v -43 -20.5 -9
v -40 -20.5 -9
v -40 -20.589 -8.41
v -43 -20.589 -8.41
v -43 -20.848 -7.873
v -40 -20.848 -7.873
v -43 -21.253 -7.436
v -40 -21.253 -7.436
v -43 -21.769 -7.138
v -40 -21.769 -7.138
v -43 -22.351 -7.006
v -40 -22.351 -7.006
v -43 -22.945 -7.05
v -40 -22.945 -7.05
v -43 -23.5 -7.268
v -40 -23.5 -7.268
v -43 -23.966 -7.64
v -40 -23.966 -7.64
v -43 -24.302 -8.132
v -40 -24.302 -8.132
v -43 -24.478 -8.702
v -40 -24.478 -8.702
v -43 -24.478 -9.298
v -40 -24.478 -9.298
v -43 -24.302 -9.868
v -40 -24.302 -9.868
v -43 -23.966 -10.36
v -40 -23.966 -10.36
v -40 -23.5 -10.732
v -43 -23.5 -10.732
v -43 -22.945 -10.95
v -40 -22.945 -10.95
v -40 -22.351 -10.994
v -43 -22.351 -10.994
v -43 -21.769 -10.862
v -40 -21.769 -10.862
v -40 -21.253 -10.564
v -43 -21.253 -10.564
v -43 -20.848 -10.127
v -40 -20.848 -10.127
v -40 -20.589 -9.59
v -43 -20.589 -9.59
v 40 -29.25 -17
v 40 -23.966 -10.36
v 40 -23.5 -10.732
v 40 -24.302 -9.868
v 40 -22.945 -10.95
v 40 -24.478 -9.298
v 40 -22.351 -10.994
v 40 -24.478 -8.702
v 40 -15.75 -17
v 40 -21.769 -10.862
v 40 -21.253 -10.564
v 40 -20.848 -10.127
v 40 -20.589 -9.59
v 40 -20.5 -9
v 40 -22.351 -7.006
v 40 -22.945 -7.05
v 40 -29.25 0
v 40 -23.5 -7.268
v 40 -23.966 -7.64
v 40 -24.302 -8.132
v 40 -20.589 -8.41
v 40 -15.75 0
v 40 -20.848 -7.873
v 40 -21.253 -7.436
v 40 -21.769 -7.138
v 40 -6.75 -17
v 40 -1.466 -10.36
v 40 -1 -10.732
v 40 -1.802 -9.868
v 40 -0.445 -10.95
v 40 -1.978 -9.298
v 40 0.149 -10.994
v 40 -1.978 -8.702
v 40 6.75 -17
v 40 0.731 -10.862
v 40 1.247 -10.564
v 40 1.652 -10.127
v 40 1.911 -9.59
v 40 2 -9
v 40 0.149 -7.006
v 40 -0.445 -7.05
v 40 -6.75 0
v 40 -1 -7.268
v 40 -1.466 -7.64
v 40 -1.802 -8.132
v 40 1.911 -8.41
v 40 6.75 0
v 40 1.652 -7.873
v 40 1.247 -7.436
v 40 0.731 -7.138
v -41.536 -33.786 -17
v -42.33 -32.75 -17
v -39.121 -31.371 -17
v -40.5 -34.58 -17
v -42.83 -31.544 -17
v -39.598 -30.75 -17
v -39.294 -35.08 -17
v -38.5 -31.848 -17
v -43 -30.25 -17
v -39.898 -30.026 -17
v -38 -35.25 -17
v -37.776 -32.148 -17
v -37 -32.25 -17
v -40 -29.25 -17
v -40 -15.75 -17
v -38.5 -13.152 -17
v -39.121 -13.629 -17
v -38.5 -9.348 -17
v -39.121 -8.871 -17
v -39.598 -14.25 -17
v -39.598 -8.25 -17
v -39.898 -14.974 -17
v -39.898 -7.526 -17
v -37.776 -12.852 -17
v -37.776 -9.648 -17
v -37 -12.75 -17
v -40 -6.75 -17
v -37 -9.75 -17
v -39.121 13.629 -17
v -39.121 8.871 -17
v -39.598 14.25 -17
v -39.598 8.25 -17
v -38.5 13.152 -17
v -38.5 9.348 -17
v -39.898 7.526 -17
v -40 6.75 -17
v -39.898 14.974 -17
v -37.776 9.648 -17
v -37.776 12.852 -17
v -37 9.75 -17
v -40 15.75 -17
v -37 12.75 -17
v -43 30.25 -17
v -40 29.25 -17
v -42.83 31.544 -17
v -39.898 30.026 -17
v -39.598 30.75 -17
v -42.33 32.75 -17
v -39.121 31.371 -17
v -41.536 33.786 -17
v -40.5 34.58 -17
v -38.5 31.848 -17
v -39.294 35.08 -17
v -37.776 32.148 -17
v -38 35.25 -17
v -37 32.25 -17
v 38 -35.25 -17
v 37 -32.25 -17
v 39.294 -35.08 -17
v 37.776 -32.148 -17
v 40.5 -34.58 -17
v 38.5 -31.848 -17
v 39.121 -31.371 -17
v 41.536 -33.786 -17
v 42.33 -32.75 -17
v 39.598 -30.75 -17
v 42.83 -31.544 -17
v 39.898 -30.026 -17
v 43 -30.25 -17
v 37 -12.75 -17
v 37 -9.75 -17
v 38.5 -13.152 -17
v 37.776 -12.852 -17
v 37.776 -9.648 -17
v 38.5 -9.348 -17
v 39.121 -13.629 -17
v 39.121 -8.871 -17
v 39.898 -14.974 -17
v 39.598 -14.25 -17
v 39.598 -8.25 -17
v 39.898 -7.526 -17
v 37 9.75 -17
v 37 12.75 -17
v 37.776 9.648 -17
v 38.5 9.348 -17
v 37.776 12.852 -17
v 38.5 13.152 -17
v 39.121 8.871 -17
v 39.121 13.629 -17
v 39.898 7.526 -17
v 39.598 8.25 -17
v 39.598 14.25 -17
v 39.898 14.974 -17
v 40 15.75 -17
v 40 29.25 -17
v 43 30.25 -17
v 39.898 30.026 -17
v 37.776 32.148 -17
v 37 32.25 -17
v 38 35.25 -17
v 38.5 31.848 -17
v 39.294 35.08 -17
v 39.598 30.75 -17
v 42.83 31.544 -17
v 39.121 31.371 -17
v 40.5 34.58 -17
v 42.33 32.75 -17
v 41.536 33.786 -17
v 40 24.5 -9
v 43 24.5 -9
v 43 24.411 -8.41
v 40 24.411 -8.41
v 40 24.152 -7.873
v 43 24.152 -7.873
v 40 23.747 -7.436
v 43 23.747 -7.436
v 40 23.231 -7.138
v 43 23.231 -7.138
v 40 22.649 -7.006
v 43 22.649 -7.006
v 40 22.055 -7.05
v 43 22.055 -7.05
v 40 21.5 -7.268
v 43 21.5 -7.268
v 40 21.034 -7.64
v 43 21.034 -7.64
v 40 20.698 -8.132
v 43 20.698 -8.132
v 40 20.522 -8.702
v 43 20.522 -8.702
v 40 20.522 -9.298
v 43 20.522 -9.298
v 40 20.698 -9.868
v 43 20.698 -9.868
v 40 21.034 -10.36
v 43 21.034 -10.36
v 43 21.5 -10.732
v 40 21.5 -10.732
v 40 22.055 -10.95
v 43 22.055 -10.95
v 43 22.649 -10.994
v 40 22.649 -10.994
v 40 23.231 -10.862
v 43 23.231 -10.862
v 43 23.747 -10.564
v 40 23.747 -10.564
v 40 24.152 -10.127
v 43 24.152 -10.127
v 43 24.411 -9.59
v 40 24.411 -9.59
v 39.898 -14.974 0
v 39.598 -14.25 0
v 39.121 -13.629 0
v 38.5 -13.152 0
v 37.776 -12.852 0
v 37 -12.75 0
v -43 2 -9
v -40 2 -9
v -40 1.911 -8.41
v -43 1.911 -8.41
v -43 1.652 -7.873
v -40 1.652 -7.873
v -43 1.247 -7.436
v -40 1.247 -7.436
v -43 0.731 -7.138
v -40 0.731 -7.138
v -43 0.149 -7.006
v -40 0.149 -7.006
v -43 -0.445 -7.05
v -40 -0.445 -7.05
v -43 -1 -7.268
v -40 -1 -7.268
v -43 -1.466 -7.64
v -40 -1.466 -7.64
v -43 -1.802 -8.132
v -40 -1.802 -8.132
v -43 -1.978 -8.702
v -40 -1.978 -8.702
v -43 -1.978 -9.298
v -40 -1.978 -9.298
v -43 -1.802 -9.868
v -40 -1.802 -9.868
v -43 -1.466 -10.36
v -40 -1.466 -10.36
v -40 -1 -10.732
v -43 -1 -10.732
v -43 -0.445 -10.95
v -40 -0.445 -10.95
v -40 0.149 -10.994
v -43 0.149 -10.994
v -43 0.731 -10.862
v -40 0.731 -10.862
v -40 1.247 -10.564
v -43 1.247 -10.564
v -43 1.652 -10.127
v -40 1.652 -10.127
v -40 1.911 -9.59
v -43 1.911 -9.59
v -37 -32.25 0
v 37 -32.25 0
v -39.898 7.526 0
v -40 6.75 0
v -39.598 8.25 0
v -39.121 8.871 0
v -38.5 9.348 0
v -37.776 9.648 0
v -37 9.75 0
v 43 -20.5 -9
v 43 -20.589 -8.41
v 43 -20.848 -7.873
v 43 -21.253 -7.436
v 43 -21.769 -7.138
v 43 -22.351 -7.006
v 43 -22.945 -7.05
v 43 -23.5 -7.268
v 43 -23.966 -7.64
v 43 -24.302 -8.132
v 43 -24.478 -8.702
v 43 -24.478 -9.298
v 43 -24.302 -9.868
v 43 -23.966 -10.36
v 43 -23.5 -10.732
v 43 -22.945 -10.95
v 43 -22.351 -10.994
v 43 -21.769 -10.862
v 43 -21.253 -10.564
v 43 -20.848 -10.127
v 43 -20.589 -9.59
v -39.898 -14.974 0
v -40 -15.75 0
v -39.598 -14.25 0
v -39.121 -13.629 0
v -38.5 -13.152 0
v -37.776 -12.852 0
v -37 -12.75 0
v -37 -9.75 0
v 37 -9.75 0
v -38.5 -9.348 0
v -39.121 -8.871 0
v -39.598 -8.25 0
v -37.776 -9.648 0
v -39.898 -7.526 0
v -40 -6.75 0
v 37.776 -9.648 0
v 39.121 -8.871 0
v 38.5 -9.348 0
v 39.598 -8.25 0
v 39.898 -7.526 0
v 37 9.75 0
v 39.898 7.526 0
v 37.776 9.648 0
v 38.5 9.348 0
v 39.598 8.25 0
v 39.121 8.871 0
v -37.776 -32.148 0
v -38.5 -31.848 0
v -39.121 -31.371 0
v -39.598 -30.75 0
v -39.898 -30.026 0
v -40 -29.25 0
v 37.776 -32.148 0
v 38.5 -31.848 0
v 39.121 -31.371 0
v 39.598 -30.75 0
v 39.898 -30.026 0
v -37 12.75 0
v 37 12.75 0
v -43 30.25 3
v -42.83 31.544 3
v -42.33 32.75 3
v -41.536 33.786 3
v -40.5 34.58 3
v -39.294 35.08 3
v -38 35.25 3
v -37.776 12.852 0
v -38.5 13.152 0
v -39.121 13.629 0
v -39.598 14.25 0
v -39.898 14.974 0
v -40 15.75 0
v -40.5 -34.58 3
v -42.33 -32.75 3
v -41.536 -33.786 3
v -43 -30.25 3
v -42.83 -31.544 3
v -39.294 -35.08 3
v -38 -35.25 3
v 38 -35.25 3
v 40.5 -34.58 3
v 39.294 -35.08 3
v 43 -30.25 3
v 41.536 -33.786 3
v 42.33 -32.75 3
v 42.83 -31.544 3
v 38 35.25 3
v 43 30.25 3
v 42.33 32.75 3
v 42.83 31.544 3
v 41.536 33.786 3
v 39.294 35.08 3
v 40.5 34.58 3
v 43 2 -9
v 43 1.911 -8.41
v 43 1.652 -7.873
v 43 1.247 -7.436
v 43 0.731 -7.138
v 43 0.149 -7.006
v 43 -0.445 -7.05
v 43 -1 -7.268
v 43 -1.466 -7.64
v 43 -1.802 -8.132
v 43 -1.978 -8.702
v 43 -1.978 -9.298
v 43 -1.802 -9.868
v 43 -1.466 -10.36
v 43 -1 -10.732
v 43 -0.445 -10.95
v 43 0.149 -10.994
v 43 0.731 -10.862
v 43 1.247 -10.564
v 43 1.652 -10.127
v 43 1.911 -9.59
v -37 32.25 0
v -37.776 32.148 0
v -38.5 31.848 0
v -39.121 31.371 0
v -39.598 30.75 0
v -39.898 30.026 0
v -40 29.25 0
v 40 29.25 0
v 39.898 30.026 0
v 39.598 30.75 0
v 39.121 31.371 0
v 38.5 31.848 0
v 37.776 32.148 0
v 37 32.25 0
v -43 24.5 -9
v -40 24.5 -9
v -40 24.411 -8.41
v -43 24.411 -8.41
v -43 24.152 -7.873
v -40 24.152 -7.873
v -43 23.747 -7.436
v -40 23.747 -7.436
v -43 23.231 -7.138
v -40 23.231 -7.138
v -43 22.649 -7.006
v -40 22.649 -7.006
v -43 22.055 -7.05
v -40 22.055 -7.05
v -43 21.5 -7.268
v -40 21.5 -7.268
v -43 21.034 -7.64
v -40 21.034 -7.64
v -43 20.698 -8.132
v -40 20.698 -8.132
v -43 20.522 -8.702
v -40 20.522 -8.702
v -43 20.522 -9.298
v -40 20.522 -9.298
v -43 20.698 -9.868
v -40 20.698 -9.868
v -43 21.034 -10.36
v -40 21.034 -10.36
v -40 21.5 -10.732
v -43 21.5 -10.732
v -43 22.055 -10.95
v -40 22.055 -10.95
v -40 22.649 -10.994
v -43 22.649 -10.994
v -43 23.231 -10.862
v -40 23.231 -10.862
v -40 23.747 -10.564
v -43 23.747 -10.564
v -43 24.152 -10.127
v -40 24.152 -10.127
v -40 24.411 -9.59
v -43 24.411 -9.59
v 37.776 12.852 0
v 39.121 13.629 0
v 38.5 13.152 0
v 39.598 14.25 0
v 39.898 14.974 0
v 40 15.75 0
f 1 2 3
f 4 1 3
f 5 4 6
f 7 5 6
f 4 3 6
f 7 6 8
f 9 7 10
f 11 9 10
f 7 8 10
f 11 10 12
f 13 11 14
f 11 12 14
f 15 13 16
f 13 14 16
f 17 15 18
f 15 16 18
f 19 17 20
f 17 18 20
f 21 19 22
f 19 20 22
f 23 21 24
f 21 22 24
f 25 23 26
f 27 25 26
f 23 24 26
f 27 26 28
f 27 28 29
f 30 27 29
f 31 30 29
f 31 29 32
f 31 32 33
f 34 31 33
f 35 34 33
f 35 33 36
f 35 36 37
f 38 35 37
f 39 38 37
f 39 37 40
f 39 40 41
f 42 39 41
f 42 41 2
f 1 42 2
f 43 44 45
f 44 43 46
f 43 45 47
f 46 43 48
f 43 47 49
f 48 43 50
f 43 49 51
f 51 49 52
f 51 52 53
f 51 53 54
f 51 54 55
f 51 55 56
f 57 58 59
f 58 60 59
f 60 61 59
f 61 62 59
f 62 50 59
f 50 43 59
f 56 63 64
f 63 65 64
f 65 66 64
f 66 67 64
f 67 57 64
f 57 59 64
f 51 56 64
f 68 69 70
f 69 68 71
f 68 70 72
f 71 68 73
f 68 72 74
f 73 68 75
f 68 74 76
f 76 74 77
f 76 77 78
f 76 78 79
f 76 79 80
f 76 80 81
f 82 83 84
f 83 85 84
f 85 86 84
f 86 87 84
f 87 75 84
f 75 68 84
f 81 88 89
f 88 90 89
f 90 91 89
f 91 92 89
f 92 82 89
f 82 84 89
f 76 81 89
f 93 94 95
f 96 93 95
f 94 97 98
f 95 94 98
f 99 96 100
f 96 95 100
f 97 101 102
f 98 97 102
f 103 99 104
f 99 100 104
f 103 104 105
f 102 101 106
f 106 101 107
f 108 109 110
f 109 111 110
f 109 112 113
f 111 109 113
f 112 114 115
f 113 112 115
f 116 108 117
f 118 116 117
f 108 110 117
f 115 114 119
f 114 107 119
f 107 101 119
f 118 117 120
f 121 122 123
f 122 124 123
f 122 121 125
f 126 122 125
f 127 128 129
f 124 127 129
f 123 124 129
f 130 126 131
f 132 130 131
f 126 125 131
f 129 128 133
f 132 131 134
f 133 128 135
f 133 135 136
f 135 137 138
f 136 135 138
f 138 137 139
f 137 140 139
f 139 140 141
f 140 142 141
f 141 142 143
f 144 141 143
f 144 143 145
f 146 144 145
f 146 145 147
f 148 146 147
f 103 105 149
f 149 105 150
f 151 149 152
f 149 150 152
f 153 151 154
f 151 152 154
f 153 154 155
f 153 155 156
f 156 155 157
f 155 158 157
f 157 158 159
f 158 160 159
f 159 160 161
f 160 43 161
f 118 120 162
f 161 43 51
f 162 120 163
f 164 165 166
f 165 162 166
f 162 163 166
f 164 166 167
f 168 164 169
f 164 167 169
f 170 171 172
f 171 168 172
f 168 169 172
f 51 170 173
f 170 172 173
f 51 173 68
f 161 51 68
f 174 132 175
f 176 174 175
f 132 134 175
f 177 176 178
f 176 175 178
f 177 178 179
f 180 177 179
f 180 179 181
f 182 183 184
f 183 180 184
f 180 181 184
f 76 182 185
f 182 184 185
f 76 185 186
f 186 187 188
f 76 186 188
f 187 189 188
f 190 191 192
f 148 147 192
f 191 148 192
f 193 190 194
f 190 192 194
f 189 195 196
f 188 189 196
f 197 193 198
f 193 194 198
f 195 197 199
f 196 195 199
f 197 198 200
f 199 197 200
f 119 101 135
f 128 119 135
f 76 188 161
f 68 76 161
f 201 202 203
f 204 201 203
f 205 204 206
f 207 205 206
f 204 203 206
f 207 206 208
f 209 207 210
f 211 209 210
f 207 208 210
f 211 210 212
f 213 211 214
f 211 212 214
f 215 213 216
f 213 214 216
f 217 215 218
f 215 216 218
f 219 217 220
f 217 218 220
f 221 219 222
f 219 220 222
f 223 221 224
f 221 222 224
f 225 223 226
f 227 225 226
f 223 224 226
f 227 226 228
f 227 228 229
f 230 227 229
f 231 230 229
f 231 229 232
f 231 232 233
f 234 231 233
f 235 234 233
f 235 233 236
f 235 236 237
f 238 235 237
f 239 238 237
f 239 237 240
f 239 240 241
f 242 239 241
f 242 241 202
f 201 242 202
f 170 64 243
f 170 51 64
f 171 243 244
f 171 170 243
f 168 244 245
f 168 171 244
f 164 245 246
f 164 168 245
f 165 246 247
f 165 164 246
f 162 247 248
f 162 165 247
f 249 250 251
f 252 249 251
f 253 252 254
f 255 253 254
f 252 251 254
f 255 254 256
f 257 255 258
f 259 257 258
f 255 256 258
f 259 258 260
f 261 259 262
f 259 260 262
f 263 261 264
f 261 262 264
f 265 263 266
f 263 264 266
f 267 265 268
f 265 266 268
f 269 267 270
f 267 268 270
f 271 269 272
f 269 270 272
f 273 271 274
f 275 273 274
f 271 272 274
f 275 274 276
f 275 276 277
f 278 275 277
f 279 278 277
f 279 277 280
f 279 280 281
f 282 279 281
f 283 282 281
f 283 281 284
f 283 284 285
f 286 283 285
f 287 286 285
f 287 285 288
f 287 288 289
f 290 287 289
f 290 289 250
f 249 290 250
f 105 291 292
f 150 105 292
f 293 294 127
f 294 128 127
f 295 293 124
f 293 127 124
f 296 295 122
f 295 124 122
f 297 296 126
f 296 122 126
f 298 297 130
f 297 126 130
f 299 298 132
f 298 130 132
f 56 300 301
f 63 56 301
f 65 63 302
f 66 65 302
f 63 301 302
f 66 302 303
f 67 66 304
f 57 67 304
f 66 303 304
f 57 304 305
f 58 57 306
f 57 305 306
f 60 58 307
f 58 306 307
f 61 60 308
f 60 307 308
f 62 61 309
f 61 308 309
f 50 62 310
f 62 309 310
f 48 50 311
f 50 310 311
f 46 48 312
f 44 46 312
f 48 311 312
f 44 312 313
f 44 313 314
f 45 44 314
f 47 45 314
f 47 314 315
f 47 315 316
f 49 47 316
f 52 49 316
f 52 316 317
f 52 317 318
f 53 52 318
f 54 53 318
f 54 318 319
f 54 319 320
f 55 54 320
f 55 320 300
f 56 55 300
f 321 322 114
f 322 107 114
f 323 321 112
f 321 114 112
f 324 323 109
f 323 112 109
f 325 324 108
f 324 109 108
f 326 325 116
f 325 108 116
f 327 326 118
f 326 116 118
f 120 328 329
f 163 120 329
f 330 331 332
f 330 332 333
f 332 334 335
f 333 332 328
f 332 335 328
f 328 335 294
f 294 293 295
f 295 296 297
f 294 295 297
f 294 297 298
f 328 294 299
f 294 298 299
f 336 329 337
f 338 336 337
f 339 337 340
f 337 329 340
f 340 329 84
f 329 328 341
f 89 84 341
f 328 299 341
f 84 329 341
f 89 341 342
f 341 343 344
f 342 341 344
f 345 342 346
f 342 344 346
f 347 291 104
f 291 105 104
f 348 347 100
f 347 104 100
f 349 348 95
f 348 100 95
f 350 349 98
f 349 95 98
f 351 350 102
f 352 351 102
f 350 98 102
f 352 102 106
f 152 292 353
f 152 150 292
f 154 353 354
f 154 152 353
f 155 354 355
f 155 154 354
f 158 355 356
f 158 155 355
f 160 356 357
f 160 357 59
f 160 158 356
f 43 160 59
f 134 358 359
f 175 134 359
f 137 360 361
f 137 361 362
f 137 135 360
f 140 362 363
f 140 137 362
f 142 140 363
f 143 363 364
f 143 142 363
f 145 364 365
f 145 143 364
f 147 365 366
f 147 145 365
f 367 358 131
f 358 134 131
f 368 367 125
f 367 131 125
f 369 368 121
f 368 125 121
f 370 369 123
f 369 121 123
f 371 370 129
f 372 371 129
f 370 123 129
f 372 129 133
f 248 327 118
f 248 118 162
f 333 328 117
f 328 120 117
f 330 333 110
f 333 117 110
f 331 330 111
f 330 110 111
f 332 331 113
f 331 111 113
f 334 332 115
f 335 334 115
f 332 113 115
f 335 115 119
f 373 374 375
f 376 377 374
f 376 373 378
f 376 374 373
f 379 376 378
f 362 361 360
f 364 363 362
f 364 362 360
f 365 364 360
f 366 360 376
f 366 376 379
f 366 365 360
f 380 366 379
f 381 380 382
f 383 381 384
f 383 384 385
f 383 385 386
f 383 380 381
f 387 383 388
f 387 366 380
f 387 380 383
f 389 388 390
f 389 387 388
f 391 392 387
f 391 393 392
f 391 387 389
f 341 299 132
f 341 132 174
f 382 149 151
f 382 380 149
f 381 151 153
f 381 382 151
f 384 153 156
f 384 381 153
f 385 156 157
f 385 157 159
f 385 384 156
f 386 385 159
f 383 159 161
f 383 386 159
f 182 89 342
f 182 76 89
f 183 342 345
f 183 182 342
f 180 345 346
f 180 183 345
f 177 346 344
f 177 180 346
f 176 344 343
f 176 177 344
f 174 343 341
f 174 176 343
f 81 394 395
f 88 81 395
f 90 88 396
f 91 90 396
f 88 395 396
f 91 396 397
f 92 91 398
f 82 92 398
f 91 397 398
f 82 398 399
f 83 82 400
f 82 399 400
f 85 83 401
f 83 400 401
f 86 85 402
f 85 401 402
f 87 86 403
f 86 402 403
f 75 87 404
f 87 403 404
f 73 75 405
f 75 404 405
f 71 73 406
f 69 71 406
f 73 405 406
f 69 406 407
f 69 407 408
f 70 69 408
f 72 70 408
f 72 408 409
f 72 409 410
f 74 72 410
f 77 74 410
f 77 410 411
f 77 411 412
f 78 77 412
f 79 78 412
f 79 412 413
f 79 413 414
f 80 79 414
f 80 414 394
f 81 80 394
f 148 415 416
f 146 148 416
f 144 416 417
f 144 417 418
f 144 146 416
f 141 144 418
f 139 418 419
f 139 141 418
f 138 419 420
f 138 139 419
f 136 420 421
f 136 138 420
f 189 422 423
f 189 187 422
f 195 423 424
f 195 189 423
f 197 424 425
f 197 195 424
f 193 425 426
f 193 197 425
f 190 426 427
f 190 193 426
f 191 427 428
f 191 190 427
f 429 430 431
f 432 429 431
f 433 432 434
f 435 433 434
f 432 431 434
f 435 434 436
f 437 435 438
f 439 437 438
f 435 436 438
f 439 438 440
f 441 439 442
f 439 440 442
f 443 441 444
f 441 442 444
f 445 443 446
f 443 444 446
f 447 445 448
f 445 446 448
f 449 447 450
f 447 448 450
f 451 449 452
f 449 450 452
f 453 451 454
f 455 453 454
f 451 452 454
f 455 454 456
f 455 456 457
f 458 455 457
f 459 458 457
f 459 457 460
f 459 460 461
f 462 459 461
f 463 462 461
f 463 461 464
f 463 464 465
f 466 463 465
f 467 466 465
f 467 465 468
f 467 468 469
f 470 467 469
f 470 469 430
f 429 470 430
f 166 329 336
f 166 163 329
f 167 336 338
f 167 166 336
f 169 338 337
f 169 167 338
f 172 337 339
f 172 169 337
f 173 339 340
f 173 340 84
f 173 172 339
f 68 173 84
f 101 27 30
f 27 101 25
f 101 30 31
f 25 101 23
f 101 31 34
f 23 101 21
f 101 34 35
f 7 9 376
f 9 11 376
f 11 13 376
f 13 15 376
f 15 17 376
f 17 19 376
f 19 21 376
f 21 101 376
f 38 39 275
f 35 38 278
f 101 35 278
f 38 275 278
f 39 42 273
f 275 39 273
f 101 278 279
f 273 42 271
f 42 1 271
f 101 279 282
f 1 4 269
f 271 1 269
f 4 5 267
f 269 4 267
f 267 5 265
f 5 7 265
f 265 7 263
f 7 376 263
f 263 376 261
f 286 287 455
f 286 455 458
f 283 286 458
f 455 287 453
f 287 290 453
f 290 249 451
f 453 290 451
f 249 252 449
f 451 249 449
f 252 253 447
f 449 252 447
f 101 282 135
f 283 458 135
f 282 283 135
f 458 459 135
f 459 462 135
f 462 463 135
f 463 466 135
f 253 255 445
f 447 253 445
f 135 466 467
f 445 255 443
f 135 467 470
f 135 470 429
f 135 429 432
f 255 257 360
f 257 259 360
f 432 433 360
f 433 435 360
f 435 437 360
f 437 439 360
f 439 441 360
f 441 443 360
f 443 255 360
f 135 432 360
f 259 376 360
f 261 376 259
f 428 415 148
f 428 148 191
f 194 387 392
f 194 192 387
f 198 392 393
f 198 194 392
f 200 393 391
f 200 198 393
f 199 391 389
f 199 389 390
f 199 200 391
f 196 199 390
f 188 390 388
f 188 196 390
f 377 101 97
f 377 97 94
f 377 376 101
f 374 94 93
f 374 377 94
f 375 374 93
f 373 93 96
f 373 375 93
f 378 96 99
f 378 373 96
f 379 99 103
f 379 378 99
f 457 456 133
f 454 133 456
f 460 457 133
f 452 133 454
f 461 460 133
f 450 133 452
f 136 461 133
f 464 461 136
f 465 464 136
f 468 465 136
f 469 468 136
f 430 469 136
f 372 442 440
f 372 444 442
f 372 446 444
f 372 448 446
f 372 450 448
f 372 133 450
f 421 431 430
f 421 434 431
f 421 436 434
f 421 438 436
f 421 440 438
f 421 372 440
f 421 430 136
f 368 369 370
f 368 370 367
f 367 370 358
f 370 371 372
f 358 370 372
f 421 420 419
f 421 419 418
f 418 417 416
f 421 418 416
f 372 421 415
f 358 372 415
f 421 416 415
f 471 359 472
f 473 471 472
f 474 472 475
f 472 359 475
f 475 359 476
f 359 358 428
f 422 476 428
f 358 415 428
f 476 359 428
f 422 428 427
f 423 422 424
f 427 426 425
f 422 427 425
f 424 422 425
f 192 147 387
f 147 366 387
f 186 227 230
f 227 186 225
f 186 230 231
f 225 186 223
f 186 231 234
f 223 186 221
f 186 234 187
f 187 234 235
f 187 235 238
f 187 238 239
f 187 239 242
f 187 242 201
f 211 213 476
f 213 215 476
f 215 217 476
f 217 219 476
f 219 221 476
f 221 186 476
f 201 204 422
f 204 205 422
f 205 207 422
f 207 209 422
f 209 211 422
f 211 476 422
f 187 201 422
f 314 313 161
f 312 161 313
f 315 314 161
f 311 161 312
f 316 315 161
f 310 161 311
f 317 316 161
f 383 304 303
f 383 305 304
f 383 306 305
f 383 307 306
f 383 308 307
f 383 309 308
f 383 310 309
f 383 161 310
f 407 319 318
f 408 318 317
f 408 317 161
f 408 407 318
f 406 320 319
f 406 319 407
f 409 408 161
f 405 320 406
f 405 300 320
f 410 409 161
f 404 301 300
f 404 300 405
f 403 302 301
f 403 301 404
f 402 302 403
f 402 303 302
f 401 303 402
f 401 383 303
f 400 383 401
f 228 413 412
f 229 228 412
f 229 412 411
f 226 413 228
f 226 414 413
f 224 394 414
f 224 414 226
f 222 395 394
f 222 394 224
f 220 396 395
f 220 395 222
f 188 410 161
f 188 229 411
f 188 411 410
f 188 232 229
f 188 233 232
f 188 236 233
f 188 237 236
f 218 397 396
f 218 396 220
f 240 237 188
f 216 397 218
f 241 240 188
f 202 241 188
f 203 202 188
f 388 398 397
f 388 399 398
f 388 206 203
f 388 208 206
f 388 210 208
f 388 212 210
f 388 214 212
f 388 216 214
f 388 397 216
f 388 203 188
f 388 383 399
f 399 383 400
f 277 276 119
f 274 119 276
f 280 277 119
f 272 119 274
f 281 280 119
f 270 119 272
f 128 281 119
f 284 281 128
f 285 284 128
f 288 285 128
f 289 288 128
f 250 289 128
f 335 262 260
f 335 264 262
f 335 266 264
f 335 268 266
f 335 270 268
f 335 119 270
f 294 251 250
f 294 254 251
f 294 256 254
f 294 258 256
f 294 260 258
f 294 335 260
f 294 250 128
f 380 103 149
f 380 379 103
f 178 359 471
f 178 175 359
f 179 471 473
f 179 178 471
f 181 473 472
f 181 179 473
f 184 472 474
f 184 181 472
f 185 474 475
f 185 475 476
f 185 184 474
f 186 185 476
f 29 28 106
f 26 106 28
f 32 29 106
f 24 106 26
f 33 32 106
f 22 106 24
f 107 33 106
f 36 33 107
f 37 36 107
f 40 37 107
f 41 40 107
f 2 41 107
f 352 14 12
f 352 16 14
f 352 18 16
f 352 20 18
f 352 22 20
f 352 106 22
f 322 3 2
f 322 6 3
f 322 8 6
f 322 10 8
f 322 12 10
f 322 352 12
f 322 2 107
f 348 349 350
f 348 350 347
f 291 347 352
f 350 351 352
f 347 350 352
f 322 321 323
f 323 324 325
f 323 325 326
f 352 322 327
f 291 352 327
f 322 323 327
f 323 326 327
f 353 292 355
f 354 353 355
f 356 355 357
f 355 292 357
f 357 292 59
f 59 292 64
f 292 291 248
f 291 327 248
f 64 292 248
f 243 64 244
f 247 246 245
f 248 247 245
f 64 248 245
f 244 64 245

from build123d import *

# Parameters (mm, degrees)
F0_W     = 86
F0_H     = 70.5
F0_W_2   = 80
F0_H_2   = 19.5
F1_DEPTH = 3
F2_DEPTH = 17
F4_D     = 4
F5_R     = 3
F6_R     = 5


with BuildPart() as f1:
    # F0 (on Top) → F1 (new body)
    with BuildSketch(Plane.XY):
        Rectangle(F0_W, F0_H)
        with Locations((0, -22.5)):
            Rectangle(F0_W_2, F0_H_2, mode=Mode.SUBTRACT)
        Rectangle(F0_W_2, F0_H_2, mode=Mode.SUBTRACT)
        with Locations((0, 22.5)):
            Rectangle(F0_W_2, F0_H_2, mode=Mode.SUBTRACT)
        with Locations((0, -22.5)):
            Rectangle(F0_W_2, F0_H_2)
        Rectangle(F0_W_2, F0_H_2)
        with Locations((0, 22.5)):
            Rectangle(F0_W_2, F0_H_2)
    extrude(amount=F1_DEPTH)

    # F0 (on Top) → F2 (join)
    with BuildSketch(Plane.XY):
        Rectangle(F0_W, F0_H)
        with Locations((0, -22.5)):
            Rectangle(F0_W_2, F0_H_2, mode=Mode.SUBTRACT)
        Rectangle(F0_W_2, F0_H_2, mode=Mode.SUBTRACT)
        with Locations((0, 22.5)):
            Rectangle(F0_W_2, F0_H_2, mode=Mode.SUBTRACT)
    extrude(amount=-F2_DEPTH)

    # F4 (through all)
    with Locations(Plane(origin=(-43, 0, 0), x_dir=(0, -1, 0), z_dir=(-1, 0, 0))):
        with Locations((-22.5, -9), (0, -9), (22.5, -9)):
            Hole(F4_D / 2)

    # F5
    f5_edges = [f1.edges().sort_by_distance(p)[0] for p in [
        (40, 32.25, -8.5),
        (-40, 32.25, -8.5),
        (-40, 12.75, -8.5),
        (40, 12.75, -8.5),
        (40, -9.75, -8.5),
        (-40, -9.75, -8.5),
        (-40, 9.75, -8.5),
        (40, 9.75, -8.5),
        (40, -12.75, -8.5),
        (-40, -12.75, -8.5),
        (-40, -32.25, -8.5),
        (40, -32.25, -8.5),
    ]]
    fillet(f5_edges, radius=F5_R)

    # F6
    f6_edges = [f1.edges().sort_by_distance(p)[0] for p in [
        (43, 35.25, -7),
        (43, -35.25, -7),
        (-43, -35.25, -7),
        (-43, 35.25, -7),
    ]]
    fillet(f6_edges, radius=F6_R)


solid = f1.part
